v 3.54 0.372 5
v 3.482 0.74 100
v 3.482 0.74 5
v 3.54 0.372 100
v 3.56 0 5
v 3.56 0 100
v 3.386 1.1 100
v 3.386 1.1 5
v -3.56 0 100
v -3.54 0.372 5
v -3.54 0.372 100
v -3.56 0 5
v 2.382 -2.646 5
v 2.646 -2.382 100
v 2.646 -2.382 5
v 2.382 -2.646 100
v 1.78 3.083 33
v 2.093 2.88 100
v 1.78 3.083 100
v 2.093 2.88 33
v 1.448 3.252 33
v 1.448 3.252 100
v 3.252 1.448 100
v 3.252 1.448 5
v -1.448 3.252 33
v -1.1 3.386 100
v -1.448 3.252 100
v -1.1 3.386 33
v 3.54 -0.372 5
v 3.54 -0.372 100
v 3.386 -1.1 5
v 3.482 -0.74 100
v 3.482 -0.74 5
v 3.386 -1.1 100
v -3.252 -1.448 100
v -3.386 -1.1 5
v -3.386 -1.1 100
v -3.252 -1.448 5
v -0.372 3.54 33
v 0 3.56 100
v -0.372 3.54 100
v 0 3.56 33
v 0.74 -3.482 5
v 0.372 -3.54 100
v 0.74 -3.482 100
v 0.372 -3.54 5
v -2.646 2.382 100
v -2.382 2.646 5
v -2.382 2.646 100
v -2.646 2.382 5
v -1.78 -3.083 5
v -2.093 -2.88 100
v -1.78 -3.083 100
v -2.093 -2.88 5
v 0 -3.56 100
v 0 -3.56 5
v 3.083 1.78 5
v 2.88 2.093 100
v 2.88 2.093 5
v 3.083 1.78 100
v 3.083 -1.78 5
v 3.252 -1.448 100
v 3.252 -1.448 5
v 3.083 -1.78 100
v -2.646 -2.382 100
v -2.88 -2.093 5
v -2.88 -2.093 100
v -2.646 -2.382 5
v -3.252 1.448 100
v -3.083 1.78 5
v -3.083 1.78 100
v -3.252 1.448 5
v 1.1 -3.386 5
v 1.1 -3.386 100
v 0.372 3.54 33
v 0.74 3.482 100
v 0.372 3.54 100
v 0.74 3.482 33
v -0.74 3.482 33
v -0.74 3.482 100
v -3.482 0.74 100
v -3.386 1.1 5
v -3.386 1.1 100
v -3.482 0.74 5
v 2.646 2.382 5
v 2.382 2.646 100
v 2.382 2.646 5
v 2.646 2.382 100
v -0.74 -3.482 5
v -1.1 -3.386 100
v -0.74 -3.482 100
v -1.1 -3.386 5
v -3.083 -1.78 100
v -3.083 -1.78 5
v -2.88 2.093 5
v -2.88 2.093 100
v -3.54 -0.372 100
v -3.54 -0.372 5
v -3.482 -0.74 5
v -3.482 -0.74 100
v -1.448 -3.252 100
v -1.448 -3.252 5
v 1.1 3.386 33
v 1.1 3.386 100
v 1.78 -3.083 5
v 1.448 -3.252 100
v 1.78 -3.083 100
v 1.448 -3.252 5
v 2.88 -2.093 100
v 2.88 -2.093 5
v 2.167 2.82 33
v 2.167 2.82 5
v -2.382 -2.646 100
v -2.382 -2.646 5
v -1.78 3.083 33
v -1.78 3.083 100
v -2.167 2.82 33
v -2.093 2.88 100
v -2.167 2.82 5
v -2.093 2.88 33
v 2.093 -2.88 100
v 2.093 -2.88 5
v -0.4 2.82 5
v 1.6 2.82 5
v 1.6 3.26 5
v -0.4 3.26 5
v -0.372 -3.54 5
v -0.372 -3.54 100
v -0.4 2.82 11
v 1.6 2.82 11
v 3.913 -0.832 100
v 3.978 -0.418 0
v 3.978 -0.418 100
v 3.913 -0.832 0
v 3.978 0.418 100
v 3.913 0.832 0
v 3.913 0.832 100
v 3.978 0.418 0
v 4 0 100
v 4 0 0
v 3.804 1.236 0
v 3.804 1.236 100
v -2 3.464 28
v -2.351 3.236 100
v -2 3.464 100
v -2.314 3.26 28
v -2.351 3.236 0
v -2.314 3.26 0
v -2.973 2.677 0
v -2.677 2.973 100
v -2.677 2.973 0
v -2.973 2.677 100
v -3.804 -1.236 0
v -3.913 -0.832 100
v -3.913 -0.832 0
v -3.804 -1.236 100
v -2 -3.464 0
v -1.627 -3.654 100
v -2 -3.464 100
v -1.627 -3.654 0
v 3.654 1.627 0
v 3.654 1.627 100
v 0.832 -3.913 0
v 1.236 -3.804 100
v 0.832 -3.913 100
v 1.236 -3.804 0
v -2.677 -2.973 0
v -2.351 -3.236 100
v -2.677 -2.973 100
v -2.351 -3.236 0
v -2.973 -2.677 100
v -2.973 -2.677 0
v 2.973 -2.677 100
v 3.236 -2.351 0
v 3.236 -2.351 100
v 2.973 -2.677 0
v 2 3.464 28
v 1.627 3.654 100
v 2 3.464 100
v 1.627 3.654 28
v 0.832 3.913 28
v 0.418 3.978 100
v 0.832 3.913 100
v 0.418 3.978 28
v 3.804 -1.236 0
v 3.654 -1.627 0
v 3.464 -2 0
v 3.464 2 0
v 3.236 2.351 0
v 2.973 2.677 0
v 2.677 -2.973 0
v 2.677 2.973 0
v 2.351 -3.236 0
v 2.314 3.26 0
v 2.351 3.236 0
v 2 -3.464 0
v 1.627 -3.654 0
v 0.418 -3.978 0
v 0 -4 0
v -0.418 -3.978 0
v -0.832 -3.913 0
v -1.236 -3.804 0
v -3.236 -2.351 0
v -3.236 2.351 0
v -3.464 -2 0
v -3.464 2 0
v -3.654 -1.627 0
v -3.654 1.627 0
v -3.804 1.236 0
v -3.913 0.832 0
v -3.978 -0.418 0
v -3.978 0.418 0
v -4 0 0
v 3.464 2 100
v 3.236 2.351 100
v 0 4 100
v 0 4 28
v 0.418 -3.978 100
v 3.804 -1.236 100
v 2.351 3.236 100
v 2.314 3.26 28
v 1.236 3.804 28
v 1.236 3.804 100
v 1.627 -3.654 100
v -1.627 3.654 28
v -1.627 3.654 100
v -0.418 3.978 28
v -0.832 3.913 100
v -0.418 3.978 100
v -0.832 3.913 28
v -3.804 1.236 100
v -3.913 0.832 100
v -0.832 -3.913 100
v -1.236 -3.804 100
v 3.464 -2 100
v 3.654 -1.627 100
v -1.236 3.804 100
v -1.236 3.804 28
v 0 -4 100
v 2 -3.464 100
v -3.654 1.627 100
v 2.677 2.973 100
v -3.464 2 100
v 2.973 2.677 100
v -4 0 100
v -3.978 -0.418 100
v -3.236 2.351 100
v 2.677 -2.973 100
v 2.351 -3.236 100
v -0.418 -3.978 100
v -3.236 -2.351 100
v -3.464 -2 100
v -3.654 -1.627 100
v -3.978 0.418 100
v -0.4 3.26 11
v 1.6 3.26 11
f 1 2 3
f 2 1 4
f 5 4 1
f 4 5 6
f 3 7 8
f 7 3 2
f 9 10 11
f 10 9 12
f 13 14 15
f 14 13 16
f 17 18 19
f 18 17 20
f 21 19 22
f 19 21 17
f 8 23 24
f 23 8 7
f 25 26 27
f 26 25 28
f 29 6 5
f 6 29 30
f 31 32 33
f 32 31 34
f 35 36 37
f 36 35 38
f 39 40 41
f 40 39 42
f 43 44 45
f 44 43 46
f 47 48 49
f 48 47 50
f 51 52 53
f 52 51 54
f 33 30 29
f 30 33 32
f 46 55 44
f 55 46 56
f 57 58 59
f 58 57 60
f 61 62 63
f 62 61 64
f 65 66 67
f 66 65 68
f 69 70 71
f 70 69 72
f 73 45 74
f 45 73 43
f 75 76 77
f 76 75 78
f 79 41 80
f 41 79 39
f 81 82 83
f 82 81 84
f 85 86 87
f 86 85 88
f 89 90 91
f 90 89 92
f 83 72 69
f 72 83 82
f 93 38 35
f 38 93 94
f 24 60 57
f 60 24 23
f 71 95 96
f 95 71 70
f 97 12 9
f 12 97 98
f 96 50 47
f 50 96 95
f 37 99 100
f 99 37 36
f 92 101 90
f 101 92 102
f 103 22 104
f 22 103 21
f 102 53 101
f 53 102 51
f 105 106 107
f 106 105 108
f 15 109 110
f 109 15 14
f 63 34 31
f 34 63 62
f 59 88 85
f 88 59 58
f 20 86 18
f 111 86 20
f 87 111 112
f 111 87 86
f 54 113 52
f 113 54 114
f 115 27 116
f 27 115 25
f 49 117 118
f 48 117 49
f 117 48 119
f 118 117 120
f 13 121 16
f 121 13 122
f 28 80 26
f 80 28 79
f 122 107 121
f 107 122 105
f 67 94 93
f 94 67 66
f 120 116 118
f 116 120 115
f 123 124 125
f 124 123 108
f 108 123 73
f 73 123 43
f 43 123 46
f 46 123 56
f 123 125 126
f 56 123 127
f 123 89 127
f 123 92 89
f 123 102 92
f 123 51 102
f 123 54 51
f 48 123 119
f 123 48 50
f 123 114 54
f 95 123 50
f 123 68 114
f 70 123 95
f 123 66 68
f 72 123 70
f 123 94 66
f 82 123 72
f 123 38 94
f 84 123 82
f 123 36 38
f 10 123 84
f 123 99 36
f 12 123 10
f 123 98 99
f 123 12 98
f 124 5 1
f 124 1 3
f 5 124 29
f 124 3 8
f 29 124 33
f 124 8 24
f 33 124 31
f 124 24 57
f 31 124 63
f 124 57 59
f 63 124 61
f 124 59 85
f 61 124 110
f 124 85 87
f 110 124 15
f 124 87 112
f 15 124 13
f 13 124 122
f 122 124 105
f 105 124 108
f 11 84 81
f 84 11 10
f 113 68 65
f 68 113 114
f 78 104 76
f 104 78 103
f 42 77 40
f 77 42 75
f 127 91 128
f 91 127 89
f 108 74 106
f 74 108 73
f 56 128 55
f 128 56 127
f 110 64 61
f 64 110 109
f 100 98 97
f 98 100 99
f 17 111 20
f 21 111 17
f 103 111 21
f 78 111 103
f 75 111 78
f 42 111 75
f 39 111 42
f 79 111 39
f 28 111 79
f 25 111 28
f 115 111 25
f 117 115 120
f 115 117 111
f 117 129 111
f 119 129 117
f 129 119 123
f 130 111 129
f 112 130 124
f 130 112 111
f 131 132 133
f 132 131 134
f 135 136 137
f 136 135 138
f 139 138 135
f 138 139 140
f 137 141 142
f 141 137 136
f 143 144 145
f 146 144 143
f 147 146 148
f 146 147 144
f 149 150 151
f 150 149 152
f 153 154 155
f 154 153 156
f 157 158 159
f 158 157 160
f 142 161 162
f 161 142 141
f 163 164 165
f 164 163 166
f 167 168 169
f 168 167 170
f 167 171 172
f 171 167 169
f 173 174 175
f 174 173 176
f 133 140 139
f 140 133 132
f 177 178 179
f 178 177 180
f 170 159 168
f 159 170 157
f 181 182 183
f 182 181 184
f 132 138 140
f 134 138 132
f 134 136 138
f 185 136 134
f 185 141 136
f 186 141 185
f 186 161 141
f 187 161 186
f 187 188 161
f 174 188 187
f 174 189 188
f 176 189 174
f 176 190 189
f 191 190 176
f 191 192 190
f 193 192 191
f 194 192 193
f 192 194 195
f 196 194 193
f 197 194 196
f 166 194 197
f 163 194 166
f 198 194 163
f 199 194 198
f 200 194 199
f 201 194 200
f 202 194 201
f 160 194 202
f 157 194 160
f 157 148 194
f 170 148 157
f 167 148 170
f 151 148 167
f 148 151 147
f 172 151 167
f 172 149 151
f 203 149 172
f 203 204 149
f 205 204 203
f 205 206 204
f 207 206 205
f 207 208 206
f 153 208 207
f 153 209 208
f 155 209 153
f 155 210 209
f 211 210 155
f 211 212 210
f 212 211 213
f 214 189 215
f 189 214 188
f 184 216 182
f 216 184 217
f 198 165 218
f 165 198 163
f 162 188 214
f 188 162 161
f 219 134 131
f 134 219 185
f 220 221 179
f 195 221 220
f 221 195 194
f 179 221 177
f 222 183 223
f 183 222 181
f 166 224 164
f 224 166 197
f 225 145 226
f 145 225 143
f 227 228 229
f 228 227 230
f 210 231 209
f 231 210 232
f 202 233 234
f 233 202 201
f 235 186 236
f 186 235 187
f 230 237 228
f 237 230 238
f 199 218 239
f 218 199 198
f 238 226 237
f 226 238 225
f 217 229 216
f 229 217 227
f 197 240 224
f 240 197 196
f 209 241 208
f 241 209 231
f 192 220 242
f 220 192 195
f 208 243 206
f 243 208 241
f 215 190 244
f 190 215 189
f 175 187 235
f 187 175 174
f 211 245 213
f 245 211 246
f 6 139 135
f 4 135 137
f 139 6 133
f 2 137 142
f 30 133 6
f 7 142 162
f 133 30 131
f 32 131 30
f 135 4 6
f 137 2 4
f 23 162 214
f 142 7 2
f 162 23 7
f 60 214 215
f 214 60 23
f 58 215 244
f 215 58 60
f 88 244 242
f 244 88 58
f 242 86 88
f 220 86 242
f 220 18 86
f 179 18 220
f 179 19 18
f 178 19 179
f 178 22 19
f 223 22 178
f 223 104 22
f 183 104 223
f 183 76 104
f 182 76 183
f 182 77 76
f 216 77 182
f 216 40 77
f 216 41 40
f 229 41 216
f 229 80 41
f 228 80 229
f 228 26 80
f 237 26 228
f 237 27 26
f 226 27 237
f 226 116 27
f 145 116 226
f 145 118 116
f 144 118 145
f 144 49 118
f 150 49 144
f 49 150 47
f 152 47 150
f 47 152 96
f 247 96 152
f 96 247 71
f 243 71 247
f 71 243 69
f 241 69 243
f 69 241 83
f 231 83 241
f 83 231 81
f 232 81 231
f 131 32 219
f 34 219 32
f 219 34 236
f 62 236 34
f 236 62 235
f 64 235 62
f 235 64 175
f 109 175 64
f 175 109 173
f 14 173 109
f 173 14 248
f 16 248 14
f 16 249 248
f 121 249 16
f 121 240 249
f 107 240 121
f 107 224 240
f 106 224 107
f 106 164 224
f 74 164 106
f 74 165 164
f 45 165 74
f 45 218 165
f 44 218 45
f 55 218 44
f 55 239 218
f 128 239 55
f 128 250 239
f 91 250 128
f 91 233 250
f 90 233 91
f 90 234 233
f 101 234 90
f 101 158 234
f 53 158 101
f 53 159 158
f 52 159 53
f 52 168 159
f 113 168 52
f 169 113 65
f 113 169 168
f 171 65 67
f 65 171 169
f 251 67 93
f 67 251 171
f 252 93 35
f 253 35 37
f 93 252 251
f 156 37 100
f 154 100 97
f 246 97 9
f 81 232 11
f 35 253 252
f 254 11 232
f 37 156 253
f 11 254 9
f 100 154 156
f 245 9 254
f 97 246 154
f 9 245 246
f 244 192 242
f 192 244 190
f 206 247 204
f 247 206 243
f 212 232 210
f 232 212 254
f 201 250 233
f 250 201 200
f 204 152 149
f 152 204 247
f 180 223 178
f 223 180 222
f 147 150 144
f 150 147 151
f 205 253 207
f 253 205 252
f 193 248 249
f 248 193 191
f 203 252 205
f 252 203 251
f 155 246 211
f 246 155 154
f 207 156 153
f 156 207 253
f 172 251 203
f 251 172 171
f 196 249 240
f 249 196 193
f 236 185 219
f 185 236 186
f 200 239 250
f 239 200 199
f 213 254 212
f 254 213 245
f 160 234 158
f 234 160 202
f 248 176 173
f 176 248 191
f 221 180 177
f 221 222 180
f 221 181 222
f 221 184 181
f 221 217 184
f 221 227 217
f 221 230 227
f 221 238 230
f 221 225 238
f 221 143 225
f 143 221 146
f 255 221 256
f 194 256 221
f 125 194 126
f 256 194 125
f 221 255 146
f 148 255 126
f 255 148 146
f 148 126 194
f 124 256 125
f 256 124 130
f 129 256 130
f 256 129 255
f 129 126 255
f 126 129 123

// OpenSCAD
// file: ../../common.scad
// Make circles circular in final renders.
$fn = $preview ? 0 : 60;

// clearance in a permanent tenon/mortise joint
clearance = 0.04;

module brass() {
  color("gold") children();
}

module derlin() {
  color("dimgray") children();
}

// tube creates a hollow cylinder
module tube(h=10, id=5, od=10) {
  difference() {
    cylinder(h=h, d=od);
    cylinder(h=h, d=id);
  }
}

// default height of rings
rings_height = 1.8;

// rings of adornment.
// This engraves two rings, 1.4mm apart, at a depth of 0.4.
module rings(h=0.4, d=1, depth=0.4, spacing=1.4) {
  tube(h=h, id=d-depth, od=d);
  translate([0, 0, spacing]) tube(h=h, id=d-depth, od=d);
}

// default brass tube thickness
brass_thickness = 0.75;

// brass_tube creates a chamfered hollow cylinder with given inside diameter,
// and wall thickness of 0.75.
// Decorative rings are etched into the top and bottom.
module brass_tube(h=10, id=10, t=brass_thickness) {
  od = id + (t*2);
  cd = (id + od) / 2; // Chamfer diameter

  brass() {
    difference() {
      tube(h=h, id=id, od=od);

      // Chamfered ends
      translate([0, 0, 0]) cylinder(h=1, d1=cd, d2=id);
      translate([0, 0, h-1]) cylinder(h=1, d1=id, d2=cd);

      translate([0, 0, 2]) rings(d=od);
      translate([0, 0, h-2-rings_height]) rings(d=od);
    }
  }
}

// brass_bend provides a 180 degree bend in brass
module brass_bend(od=12.7, bend_r=16, t=brass_thickness) {
  color("gold") {
    rotate([90, 0, 0]) {
      rotate_extrude(angle=180) {
        translate([bend_r, 0, 0]) {
          difference() {
            circle(d=od);
            circle(d=od-t*2);
          }
        }
      }
    }
  }
}


// derlin_tube is a non-chamfered sky blue tube.
// I use blue so it's easier to see in preview.
module derlin_tube(h=10, id=5, od=10) {
  derlin() {
    tube(h=h, id=id, od=od);
  }
}

// derlin_stop is a derlin tube, chamfered on one end.
module derlin_stop(h=10, id=5, od=10) {
  chamferh = h/5;
  derlin() {
    difference() {
      union() {
        cylinder(h=h-chamferh, d=od);
        translate([0, 0, h-chamferh]) cylinder(h=chamferh, d1=od, d2=id);
        }
      cylinder(h=h, d=id);
      }
    }
}

// default bell height
bell_height = 17;

// derlin_bell makes a decorative flared bell.
// od will default to 33% larger than id.
module derlin_bell(h=bell_height, id=5, od=0) {
  chamferh = 1;
  chamferd = 1;
  ringsmargin = 1;
  toph = rings_height + ringsmargin*2 + chamferh;
  flareh = h - toph;
  od = (od == 0) ? (id * 1.33) : od;
  derlin() {
    difference() {
      union() {
        cylinder(h=flareh, d1=id, d2=od);
        translate([0, 0, flareh]) cylinder(h=toph-chamferh, d=od);
        translate([0, 0, flareh+toph-chamferh]) cylinder(h=chamferh, d1=od, d2=od-chamferd);
      }
      cylinder(h=h, d=id);
      translate([0, 0, flareh + ringsmargin]) rings(d=od);
    }
  }
}
// main file
include<../../common.scad>

id = 7.12;
od = 8;
pluglen = 5;  // Length of the plug at the end
opening = [2, 10, 6]; // Opening size
cutaway = [10, 0.74, 28]; // Tongue cutaway

module reed_body() {
  difference() {
    // The main piece
    cylinder(h=100, d=od);

    // Inner bore
    translate([0, 0, pluglen]) {
      difference() {
        cylinder(h=100, d=id);

        // Leave material for a platform on the tongue cutaway
        translate([-5, id/2 - cutaway[1], 0]) cube(cutaway);
      }
    }

    // Tongue cutaway
    translate([-5, od/2 - cutaway[1], 0]) cube(cutaway);

    // Opening
    translate([-opening[0]/2+.6, 0, pluglen]) cube(opening);
  }
}

reed_body();
